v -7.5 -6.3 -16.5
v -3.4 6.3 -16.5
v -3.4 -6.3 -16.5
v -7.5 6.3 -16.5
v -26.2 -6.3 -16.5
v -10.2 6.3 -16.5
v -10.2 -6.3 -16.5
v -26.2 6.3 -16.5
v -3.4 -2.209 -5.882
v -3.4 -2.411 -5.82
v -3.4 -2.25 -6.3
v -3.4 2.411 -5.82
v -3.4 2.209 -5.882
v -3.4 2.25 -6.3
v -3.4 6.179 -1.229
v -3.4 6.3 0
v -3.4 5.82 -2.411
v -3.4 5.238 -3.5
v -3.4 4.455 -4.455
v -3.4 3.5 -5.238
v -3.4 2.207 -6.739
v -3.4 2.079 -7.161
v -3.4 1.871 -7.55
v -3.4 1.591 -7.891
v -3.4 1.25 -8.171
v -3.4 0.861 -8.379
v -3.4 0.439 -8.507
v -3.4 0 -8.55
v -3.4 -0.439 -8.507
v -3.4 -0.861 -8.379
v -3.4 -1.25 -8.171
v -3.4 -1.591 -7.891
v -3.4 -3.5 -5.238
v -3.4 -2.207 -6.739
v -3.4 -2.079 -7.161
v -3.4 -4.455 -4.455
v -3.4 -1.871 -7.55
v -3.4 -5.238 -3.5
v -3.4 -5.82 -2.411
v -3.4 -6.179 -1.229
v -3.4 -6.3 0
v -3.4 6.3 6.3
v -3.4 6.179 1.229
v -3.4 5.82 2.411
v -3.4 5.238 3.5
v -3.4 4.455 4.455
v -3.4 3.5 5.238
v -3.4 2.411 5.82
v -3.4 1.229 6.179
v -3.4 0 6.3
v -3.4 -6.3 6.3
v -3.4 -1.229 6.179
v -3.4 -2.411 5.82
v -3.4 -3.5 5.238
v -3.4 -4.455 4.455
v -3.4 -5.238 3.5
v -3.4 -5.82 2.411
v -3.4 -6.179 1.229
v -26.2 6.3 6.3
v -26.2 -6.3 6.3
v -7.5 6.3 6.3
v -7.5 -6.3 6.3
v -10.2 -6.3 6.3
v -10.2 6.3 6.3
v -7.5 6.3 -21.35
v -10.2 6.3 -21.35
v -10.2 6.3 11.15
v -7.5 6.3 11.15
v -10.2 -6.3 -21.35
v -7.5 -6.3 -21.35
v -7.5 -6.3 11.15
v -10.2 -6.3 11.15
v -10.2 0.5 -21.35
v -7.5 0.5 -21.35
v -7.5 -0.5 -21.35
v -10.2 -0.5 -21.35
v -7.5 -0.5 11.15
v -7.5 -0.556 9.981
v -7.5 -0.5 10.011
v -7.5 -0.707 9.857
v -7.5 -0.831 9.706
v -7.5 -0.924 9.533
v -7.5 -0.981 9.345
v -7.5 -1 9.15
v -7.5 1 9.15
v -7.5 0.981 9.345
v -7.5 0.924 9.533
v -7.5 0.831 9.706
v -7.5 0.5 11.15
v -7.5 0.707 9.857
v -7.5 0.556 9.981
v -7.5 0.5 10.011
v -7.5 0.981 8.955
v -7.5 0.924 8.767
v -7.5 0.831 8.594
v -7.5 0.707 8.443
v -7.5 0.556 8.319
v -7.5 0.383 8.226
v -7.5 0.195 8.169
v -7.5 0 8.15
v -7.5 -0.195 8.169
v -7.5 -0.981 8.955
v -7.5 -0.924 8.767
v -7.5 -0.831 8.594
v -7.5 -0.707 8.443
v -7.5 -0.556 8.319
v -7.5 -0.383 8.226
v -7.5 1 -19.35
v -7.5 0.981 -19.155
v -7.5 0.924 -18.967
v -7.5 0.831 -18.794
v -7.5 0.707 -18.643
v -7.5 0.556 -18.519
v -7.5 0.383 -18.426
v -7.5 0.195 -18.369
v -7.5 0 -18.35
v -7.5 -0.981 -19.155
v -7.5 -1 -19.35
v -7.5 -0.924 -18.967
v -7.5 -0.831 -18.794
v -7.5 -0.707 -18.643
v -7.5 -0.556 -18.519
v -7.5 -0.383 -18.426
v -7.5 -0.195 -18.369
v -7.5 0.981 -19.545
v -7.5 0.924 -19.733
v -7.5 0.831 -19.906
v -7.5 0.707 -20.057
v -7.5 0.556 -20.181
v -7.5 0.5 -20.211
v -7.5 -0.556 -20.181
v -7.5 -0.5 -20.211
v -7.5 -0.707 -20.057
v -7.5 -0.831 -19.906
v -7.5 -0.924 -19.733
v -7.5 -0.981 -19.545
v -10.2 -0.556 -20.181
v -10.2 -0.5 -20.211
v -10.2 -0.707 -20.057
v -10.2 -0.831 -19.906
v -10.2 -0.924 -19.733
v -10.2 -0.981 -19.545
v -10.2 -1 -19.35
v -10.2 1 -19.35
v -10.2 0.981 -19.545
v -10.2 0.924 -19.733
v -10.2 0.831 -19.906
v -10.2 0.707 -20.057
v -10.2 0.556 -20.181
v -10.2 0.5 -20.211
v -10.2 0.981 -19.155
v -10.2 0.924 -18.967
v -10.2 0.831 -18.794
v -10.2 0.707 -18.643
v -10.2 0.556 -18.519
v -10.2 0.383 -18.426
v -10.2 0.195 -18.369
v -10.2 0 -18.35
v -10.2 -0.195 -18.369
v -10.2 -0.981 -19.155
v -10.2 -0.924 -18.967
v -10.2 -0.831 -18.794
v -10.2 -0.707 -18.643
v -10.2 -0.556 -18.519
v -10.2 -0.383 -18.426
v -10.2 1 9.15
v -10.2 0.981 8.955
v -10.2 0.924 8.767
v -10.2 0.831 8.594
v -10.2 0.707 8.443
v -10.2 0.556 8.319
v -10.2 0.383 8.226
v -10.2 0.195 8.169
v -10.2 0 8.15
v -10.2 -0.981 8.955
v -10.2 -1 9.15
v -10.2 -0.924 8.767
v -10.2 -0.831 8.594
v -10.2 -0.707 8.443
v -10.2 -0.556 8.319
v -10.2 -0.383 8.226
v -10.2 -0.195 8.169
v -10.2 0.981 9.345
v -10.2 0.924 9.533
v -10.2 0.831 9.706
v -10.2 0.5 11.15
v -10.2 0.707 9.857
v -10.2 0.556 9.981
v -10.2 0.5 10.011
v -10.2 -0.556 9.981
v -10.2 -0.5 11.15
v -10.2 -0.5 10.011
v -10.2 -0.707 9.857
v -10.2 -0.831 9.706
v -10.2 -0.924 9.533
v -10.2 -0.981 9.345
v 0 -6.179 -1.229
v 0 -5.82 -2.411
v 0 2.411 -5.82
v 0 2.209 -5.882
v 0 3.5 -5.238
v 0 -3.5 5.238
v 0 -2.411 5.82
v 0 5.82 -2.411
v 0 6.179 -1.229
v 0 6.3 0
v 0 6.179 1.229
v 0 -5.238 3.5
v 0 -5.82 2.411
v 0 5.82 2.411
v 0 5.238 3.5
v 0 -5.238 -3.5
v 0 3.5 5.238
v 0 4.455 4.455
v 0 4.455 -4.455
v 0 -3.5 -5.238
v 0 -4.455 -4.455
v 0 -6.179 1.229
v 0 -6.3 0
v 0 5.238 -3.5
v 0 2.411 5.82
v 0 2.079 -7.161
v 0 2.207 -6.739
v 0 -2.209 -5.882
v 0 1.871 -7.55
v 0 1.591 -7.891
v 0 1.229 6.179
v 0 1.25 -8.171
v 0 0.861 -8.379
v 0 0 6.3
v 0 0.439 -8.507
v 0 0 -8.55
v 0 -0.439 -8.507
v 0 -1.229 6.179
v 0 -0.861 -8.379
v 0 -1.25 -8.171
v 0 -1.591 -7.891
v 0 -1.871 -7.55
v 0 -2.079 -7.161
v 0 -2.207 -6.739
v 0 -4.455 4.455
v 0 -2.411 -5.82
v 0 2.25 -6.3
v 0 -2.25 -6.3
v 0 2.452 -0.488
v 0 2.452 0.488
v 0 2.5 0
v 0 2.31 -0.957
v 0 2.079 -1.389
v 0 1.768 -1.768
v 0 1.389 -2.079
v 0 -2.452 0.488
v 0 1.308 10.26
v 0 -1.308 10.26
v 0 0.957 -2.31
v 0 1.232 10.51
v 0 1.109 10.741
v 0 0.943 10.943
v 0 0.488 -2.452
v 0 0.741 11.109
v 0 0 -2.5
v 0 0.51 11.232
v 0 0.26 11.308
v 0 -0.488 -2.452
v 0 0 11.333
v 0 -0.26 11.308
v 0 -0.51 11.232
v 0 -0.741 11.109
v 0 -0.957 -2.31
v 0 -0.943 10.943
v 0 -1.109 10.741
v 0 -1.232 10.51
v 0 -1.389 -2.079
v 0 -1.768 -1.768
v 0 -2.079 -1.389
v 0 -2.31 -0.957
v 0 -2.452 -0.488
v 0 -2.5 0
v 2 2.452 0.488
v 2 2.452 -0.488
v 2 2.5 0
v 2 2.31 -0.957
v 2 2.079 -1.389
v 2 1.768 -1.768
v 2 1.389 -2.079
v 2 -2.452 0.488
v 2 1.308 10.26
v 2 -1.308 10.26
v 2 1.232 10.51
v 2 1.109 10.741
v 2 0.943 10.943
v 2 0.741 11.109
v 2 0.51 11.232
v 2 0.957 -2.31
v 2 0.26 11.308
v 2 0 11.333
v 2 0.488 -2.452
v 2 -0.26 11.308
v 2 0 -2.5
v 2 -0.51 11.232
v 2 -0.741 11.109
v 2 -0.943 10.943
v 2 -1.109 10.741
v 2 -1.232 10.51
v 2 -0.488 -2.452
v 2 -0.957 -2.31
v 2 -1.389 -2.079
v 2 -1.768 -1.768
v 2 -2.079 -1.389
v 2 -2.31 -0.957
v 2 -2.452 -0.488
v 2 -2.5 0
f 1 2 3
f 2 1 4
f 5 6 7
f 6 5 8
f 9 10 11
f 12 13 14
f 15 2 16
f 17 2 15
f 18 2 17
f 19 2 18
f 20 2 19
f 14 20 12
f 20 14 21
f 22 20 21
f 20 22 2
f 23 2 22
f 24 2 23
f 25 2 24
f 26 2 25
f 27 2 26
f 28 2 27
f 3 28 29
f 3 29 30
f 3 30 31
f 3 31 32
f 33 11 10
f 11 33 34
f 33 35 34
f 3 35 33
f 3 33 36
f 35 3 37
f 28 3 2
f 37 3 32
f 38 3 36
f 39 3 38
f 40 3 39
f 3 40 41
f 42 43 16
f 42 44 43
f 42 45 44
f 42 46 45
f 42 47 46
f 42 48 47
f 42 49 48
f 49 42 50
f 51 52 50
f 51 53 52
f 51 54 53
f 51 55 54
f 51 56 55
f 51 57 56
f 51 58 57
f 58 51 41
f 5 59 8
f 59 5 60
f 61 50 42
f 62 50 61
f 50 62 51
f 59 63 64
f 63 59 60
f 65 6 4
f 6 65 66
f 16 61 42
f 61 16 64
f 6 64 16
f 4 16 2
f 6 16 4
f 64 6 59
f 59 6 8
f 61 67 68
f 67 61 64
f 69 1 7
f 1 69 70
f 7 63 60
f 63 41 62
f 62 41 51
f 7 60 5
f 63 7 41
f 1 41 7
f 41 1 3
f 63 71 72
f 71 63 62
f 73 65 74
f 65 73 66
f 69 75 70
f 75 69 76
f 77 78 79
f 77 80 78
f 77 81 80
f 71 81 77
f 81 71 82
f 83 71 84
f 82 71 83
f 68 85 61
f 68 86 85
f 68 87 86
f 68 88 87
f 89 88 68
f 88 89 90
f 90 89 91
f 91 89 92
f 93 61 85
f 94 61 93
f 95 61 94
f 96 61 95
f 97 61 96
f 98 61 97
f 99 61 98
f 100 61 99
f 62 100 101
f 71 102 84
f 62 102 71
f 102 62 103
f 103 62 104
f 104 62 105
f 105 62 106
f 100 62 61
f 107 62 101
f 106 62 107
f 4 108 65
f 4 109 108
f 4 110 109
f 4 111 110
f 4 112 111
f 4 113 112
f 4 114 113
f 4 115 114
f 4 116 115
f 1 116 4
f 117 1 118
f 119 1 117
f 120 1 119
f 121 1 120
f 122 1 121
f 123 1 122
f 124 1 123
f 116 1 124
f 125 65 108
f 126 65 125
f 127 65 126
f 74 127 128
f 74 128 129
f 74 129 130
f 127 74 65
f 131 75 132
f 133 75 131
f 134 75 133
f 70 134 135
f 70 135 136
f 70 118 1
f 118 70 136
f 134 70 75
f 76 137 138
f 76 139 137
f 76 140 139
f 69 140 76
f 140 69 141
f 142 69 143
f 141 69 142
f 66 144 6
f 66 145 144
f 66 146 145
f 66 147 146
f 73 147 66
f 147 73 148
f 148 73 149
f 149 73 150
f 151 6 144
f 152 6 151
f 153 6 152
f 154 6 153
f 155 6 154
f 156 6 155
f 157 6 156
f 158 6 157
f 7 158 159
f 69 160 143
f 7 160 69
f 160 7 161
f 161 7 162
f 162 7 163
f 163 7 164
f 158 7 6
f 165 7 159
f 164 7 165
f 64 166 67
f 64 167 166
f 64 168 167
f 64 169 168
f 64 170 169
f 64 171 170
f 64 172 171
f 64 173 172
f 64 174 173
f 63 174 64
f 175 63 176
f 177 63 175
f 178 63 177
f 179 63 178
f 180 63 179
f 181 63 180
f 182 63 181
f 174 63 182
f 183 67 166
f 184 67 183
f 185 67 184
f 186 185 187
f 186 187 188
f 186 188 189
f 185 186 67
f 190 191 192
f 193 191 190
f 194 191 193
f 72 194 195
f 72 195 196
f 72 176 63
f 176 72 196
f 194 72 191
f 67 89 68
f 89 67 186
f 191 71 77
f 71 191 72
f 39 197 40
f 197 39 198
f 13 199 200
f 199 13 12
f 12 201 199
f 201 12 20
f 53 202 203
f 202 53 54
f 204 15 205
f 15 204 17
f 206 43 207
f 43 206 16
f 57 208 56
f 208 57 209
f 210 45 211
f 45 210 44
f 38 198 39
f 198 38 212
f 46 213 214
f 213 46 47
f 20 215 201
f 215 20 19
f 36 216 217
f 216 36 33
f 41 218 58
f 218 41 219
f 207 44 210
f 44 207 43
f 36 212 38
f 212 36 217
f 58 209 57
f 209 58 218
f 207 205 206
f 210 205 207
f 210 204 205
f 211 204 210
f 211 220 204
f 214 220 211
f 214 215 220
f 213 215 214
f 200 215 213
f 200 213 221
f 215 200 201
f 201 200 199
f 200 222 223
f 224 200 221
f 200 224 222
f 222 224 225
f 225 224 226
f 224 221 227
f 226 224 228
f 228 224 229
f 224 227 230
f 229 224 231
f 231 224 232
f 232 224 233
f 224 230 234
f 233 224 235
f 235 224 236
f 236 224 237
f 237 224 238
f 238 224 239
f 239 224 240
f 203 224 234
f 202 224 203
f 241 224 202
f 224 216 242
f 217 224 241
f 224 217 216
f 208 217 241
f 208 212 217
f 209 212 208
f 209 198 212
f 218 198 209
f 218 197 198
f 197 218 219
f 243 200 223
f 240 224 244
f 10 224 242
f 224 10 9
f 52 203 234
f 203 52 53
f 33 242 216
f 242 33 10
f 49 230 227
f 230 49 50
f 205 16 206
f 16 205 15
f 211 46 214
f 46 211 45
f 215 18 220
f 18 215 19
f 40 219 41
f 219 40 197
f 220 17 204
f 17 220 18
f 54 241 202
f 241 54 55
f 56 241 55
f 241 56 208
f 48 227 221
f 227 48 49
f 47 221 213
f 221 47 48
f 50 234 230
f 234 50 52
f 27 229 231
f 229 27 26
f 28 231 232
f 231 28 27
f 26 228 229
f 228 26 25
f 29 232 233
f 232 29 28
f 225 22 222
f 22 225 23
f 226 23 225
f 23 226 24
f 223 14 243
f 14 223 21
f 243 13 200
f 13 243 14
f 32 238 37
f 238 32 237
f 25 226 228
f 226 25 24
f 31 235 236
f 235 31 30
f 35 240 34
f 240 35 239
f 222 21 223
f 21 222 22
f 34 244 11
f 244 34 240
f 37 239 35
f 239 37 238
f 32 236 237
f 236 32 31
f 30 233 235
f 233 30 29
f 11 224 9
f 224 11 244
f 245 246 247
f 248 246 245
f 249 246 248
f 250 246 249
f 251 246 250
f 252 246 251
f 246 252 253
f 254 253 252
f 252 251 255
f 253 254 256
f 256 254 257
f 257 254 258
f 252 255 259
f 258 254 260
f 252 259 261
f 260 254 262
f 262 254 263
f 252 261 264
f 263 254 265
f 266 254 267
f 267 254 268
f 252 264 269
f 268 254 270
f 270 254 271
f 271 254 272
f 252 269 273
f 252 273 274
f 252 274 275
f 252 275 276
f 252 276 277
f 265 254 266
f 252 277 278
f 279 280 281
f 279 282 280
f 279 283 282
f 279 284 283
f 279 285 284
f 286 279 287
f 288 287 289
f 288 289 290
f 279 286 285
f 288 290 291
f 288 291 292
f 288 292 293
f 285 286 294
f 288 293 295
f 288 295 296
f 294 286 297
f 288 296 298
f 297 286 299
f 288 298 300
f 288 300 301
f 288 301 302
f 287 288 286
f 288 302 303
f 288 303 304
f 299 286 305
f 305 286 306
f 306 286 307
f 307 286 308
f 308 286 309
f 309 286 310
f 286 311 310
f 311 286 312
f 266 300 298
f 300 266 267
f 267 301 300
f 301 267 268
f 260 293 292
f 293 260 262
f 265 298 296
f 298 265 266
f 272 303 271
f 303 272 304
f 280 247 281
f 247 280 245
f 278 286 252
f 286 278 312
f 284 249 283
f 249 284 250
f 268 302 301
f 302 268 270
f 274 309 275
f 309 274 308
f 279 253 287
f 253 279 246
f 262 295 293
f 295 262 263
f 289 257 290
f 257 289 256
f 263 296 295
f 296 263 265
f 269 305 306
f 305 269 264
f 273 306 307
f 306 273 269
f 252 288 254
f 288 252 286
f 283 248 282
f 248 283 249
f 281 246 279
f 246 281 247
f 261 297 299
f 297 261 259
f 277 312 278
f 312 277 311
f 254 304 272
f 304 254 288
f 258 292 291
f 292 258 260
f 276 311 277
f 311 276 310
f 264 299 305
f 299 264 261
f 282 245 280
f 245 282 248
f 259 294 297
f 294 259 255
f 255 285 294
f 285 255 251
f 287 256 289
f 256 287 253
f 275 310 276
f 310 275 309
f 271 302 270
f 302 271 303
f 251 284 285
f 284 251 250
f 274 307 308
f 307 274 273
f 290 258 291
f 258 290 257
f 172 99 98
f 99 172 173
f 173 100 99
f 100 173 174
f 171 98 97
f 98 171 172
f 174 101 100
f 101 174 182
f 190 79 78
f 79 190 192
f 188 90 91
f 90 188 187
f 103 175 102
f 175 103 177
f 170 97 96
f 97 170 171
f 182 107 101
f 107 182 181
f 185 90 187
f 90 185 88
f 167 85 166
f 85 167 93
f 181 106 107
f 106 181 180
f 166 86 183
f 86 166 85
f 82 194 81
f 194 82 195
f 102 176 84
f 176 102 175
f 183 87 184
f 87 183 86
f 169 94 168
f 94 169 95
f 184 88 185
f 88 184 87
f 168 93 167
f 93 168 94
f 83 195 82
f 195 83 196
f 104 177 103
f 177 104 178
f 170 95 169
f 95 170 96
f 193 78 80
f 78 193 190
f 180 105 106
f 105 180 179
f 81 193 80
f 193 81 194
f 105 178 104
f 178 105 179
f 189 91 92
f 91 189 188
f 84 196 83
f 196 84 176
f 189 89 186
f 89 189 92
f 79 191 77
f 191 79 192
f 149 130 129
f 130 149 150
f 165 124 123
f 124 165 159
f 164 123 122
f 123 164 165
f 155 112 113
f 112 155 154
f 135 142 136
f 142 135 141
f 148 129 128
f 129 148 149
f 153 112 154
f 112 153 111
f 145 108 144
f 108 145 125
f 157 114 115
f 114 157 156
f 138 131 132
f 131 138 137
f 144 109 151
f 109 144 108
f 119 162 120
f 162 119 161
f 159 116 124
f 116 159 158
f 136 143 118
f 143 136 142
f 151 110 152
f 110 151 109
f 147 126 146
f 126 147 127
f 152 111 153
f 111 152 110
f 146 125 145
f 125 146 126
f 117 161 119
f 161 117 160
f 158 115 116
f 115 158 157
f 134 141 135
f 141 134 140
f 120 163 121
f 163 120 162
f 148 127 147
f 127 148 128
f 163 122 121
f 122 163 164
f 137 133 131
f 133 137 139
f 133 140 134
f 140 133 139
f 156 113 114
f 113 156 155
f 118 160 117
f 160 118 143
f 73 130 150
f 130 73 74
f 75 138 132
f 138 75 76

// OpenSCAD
// servoSG90(fn) fn = è la definizione delle curve da usare nel render
//animazione abilitabile
module servoSG90(fn) {
//    fn=32;
    L = 22.8;
    l = 12.6;
    h = 22.8;
    plateL = 32.5;
    plateH = 2.7;
    plateHPos = 16;
    topCylinderH = 3.4;
    smallTopCylinderD = 4.5;
    
    axisH = 2;
    axisD = 4;
    
    screwHoleCenter=2;
    screwHoleD=2;
    holeSize=1;
rotate([0,90,0]) translate ([-l/2,-l/2,-(h+topCylinderH)]) 
    difference() {
        union() {
            color("Blue", 0.7) {
                // main part
                cube([L, l, h]);
                // support
                translate([-(plateL - L) / 2, 0, plateHPos])    cube([plateL, l, plateH]);
                // top big cylinder
                translate([l/2,l/2,h])  cylinder(d=l, h=topCylinderH, $fn=fn);
                // top small cylinder
                translate([l, l/2, h])  cylinder(d=smallTopCylinderD, h=topCylinderH, $fn=fn);
            }
            color("white")  translate([l/2,l/2, h + topCylinderH]) {
                cylinder(d=axisD,h=axisH, $fn=fn);
                hull() {        // -------------------------------------- rimuovere da qui------------------------
                    cylinder(d=axisD+1,h=axisH, $fn=fn);
                    rotate([0,0,-90+$t*90])translate ([0,-10,0]) cylinder(d=axisD*2/3,h=axisH, $fn=fn); //translate va inserita la lunghezza del braccio
                }               // ---------------------------a qui per rimuovere il braccio del servo -----------
            }
        }
        color("grey", 0.7) {
            // screwHole -
            translate([-(plateL - L) / 2 + screwHoleCenter, l/2, plateHPos])    cylinder(d=screwHoleD, h=10, $fn=fn, center=true);
            translate([-(plateL - L) / 2 - 1, l / 2 - holeSize / 2, plateHPos - 1]) cube([3,holeSize,4]);
            // screwHole +
            translate([plateL - (plateL - L) / 2 - screwHoleCenter, l / 2, plateHPos - 1])  cylinder(d=screwHoleD, h=10, $fn=fn, center=true);
            translate([plateL- (plateL - L) / 2 - screwHoleCenter, l / 2 - holeSize / 2, plateHPos -1]) cube([3,holeSize,4]);
        }
    }
}

servoSG90(32);
